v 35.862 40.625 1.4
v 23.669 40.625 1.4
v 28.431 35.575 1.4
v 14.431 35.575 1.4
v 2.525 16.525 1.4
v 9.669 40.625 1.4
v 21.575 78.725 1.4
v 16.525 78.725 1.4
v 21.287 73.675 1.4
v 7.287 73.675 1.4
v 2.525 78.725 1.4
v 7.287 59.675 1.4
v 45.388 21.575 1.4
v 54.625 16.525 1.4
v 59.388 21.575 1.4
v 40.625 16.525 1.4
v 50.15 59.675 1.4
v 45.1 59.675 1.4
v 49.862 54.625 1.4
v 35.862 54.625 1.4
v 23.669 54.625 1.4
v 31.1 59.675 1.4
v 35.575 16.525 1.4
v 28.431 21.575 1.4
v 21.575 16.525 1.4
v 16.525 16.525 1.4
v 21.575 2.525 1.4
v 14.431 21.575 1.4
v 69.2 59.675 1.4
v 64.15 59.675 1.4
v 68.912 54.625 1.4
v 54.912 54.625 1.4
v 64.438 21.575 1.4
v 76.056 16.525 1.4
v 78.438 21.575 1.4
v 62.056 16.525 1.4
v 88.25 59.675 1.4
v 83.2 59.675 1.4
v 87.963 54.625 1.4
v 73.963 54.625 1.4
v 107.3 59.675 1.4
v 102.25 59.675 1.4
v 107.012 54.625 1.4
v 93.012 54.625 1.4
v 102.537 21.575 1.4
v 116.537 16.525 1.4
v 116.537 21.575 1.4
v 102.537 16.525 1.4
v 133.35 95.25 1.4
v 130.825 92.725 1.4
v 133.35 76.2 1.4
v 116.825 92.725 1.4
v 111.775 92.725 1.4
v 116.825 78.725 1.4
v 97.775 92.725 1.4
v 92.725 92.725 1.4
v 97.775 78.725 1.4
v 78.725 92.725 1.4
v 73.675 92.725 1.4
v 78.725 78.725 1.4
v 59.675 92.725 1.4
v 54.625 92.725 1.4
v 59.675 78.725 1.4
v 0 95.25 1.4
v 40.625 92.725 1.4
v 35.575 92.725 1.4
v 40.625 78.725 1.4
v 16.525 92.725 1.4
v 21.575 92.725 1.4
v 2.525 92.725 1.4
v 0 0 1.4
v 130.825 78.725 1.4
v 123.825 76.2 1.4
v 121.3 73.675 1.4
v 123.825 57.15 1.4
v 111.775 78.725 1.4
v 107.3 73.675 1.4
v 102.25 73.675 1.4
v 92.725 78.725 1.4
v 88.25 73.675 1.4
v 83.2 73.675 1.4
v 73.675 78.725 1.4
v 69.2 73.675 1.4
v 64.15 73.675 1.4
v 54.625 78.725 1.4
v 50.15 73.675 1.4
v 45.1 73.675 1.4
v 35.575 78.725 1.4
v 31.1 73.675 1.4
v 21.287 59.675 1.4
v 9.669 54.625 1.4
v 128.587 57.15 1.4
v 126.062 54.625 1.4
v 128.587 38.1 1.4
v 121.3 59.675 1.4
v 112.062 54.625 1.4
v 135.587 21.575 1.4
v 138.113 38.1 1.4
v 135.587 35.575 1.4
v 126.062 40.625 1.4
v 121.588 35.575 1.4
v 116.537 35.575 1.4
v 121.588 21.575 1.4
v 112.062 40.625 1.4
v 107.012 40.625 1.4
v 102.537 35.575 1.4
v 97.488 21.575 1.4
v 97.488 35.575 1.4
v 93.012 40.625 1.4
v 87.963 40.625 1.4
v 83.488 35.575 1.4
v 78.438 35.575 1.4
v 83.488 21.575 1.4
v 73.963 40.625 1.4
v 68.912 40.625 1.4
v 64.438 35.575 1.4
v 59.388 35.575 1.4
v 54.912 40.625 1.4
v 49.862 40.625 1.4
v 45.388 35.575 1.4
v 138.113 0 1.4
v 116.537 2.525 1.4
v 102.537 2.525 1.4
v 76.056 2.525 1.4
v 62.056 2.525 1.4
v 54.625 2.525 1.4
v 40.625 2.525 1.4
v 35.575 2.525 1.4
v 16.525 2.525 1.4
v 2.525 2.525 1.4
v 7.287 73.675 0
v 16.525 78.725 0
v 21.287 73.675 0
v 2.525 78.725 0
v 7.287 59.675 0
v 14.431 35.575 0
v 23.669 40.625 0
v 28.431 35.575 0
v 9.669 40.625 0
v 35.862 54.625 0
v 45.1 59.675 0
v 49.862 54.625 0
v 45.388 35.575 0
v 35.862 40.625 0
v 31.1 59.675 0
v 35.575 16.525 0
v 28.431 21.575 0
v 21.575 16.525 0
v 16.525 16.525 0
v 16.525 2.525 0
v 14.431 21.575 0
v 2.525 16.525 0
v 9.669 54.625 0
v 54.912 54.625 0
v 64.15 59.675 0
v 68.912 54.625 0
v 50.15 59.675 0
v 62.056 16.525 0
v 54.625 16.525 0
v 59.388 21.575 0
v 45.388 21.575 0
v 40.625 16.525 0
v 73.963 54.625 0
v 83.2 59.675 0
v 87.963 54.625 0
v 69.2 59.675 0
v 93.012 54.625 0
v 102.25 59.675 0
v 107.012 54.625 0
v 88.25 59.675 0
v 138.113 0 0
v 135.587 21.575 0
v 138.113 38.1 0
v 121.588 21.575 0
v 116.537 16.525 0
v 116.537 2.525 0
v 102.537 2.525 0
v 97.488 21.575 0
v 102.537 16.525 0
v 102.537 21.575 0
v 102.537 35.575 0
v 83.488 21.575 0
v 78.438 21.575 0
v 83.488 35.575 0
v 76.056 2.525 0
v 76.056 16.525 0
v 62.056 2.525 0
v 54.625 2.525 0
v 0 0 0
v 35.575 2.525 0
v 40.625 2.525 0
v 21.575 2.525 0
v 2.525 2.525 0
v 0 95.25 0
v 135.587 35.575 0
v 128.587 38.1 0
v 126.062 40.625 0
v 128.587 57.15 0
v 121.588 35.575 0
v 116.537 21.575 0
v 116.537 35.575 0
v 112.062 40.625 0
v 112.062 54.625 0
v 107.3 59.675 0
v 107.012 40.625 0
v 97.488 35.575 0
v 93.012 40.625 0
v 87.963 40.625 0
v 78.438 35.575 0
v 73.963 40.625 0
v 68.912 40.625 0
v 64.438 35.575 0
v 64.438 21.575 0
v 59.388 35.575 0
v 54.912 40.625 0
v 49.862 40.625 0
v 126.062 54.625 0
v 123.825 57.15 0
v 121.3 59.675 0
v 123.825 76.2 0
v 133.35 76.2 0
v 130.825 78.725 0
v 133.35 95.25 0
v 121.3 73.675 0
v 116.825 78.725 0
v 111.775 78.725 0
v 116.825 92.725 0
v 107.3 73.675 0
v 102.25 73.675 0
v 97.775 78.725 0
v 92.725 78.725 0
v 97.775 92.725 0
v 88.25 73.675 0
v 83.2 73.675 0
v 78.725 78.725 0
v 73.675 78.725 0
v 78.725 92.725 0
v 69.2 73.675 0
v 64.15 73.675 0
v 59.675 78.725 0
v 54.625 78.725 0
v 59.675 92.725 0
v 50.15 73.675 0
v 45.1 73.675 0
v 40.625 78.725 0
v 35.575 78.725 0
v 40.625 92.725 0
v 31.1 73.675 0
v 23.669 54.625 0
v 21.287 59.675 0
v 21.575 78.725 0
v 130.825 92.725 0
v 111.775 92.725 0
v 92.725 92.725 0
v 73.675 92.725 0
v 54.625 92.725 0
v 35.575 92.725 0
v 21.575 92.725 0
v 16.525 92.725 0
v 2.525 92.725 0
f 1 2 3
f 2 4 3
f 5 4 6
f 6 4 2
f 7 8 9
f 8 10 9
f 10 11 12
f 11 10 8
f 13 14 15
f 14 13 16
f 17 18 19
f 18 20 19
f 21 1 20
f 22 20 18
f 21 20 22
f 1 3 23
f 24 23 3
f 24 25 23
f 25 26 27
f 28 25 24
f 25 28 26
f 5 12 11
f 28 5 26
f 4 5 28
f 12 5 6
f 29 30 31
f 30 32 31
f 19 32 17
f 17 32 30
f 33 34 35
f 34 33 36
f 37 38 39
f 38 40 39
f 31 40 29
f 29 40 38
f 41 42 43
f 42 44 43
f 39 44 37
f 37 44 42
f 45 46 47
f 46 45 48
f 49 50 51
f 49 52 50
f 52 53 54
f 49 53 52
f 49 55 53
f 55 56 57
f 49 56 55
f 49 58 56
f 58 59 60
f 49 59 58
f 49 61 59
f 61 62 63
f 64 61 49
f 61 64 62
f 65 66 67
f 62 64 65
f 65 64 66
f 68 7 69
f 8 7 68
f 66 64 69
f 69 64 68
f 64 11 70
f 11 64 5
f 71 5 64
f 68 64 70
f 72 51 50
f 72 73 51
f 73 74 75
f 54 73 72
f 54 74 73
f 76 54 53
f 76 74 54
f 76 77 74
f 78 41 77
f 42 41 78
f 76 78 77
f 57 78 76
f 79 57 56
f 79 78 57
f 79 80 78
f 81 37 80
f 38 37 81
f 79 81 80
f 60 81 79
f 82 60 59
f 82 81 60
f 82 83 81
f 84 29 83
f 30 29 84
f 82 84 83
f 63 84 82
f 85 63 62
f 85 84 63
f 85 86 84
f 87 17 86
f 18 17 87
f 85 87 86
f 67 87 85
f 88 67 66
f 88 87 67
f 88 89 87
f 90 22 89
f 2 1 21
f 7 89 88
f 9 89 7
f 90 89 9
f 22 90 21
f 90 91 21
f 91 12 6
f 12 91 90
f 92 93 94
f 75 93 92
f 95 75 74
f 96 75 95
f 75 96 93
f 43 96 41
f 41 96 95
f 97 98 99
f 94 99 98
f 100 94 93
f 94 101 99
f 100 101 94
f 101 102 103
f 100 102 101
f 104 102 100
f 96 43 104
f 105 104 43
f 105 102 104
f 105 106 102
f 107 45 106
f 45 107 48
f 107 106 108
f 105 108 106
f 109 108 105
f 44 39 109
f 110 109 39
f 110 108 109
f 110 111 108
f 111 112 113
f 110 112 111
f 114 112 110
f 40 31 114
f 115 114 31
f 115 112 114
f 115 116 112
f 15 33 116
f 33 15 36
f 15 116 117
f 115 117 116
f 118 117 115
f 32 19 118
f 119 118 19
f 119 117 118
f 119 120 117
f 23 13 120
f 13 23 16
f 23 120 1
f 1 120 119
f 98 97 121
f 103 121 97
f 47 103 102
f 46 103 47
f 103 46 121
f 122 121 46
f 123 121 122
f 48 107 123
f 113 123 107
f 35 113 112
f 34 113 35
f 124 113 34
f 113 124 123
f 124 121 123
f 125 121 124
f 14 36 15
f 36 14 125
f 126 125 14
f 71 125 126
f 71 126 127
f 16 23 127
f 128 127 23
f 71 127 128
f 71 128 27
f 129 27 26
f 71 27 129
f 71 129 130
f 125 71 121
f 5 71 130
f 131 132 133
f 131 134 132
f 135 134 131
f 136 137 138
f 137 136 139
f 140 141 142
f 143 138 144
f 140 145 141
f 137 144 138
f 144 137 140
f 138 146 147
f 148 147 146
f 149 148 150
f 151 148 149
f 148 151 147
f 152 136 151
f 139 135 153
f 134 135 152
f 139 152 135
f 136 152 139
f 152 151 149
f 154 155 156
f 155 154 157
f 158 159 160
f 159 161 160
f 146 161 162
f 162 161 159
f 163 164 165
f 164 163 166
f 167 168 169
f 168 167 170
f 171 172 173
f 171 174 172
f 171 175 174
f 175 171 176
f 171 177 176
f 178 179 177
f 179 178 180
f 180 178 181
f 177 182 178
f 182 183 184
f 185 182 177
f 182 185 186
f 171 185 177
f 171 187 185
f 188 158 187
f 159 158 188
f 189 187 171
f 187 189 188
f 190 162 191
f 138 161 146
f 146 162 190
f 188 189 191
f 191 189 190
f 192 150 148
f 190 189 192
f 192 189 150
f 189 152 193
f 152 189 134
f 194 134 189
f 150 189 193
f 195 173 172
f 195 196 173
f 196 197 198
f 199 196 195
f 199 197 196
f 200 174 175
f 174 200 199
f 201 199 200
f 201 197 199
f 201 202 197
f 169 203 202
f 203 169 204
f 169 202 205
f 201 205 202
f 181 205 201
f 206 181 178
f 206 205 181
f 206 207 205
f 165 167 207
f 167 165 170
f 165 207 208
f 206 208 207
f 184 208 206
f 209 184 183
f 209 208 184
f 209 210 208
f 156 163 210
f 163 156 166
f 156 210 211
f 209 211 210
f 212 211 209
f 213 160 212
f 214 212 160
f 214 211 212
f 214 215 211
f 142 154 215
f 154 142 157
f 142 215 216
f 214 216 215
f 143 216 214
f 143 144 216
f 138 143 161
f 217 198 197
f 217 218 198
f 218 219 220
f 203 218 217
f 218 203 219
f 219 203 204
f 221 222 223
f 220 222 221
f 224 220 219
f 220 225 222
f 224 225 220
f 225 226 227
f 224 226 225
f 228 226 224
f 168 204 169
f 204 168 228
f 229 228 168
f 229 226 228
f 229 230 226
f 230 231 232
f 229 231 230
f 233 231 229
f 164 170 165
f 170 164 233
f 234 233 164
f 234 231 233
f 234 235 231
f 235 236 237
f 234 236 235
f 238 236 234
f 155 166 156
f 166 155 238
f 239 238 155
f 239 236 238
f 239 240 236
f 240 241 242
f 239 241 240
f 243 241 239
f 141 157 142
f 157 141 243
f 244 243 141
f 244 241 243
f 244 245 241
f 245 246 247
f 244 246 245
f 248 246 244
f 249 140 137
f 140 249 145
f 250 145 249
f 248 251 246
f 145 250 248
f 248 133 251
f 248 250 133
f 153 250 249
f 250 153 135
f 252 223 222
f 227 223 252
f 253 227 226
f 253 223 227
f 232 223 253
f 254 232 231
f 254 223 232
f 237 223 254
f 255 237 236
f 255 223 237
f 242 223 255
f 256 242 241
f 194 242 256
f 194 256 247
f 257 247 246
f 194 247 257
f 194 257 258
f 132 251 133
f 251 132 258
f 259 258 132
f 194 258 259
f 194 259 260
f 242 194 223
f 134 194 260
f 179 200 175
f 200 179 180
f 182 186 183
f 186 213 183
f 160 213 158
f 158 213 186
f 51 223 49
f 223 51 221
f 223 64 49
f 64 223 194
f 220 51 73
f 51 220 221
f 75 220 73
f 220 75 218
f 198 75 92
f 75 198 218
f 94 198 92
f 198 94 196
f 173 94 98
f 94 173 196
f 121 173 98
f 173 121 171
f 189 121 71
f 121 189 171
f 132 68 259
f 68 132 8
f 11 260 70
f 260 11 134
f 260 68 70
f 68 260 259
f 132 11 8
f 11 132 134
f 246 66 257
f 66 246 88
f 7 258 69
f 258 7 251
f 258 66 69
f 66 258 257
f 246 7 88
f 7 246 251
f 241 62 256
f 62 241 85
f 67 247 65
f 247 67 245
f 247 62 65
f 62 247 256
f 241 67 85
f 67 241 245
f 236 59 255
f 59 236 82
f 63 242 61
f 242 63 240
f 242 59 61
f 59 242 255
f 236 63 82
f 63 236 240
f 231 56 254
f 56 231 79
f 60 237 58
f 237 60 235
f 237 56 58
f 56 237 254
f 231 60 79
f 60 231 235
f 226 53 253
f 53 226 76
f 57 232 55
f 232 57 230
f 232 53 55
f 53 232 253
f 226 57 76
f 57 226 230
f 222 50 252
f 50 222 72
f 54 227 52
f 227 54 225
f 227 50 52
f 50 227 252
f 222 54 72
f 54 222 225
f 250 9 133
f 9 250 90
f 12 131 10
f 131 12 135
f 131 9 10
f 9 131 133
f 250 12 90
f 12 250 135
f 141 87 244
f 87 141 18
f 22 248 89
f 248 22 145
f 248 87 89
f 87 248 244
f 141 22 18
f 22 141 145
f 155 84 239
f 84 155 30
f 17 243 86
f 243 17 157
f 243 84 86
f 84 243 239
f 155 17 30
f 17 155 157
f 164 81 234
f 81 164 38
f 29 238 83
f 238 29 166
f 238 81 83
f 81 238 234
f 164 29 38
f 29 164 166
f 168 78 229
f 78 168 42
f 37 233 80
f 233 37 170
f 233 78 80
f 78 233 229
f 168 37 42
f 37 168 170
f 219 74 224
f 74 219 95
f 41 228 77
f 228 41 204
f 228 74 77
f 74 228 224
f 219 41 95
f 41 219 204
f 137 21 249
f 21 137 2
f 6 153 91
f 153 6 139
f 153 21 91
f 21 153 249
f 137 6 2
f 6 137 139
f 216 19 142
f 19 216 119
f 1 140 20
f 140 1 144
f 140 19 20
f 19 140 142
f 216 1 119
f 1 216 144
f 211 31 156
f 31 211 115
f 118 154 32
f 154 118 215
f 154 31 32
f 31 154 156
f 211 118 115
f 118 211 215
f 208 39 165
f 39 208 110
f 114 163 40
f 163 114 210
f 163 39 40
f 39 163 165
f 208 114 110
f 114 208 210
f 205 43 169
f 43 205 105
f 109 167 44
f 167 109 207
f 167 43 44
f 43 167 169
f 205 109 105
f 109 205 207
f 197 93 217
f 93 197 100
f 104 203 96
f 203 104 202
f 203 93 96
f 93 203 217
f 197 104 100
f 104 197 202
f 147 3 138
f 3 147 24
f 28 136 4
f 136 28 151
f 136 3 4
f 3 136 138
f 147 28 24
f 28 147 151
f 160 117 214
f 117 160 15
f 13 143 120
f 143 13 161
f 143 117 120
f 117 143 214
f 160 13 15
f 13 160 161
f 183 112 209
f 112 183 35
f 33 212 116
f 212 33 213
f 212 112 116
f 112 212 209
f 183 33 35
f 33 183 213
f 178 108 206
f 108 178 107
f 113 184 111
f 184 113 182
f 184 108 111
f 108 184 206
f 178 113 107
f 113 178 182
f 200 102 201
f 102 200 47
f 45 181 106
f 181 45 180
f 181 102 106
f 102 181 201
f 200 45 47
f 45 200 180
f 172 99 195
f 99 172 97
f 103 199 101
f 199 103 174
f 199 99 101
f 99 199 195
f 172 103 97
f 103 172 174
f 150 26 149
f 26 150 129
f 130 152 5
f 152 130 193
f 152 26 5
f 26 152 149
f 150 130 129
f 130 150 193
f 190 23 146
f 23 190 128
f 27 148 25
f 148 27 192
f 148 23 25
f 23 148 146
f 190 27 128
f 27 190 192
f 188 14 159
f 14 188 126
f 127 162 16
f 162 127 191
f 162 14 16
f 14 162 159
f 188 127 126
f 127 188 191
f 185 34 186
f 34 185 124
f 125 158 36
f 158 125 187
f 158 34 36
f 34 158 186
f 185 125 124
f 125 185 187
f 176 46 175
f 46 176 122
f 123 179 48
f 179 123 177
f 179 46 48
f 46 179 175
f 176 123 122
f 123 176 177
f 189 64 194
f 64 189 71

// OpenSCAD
//Thickness of entire plate
plateThickness=1.4;
//Unit square length, from Cherry MX data sheet
lkey=19.05;
//Hole size, from Cherry MX data sheet
holesize=14;
//length, in units, of board
width=14.5;
//Height, in units, of board
height=5;
//Radius of mounting holes
mountingholeradius=1.5;
//height of switch clasp cutouts
cutoutheight = 3;
//width of switch clasp cutouts
cutoutwidth = 1;

// lower case generation
// cavity_height is the space in the lower case. Needs to be at last as tall
// as much as the key switches will extend below the plate or else they won't
// fit together.
cavity_height = 8; 

// case_floor_thickness: recommended to be at least 1.0mm. Also recommended to
// be an even multiple of your layer height. E.g., if layer height is 0.3mm,
// use 1.2 or 1.5. Don't use 1.0 because it can't be evenly divided by 0.3.
case_floor_thickness = 0.9;
// total case height: cavity_height + case_floor_thickness
case_height = cavity_height + case_floor_thickness;
// case_wall_thickness: For rigidity, recommend to be at least 3x your nozzle
// size. Also recommended to be an even multiple of your nozzle size.
case_wall_thickness = 1.2;
// inner and outer radius of mounting standoff on case
mount_receiver_outer_radius = mountingholeradius+0.5;
mount_receiver_inner_radius = mountingholeradius-0.5;


//calculated vars

holediff=lkey-holesize;
w=width*lkey;
h=height*lkey;

// [[column, row], offset (key width)]
//my custom keyboard layout layer
// http://www.keyboard-layout-editor.com/##@@=Esc&=!%0A1&=%2F@%0A2&=%23%0A3&=$%0A4&=%25%0A5&=%5E%0A6&=%2F&%0A7&=*%0A8&=(%0A9&=)%0A0&=%2F_%0A-&=+%0A%2F=&_w:1.5%3B&=Backspace%3B&@_w:1.5%3B&=Tab&=Q&=W&=E&=R&=T&=Y&=U&=I&=O&=P&=%7B%0A%5B&=%7D%0A%5D&=%7C%0A%5C%3B&@_w:1.75%3B&=Ctrl%0ACaps&=A&=S&=D&=F&=G&=H&=J&=K&=L&=%2F:%0A%2F%3B&=%22%0A'&_w:1.75%3B&=Enter%3B&@_w:2.25%3B&=Shift&=Z&=X&=C&=V&=B&=N&=M&=%3C%0A,&=%3E%0A.&_w:1.25%3B&=%3F%0A%2F%2F&=%E2%86%91&=Shift%0A%E7%84%A1%E5%A4%89%E6%8F%9B%3B&@=Fn&=~%0A%0A%0A%0A%0A%0A%60&=Alt&_w:1.25%3B&=Cmd%0A%E8%8B%B1%E6%95%B0&_w:3%3B&=&_w:3%3B&=&_w:1.25%3B&=Cmd%0A%E3%81%8B%E3%81%AA%0A%0A%0A%0A%0A%E3%82%AB%E3%83%8A&=%E2%86%90&=%E2%86%93&=%E2%86%92
myKeyboard = [
//start ROW 0
[[0,0],1], // esc
[[1,0],1], // 1
[[2,0],1], // 2
[[3,0],1], // 3
[[4,0],1], // 4
[[5,0],1], // 5
[[6,0],1], // 6
[[7,0],1], // 7
[[8,0],1], // 8
[[9,0],1], // 9
[[10,0],1], // 0
[[11,0],1], // -
[[12,0],1], // =
[[13,0],1.5], // bksp
//start ROW 1
[[  0,1],1.5], // tab
[[1.5,1],1], // q
[[2.5,1],1], // w
[[3.5,1],1], // e
[[4.5,1],1], // r
[[5.5,1],1], // t
[[6.5,1],1], // y
[[7.5,1],1], // u
[[8.5,1],1], // i
[[9.5,1],1], // o
[[10.5,1],1], // p
[[11.5,1],1], // [
[[12.5,1],1], // ]
[[13.5,1],1], // \
//start ROW 2
[[   0,2],1.75], // ctrl
[[1.75,2],1], // a
[[2.75,2],1], // s
[[3.75,2],1], // d
[[4.75,2],1], // f
[[5.75,2],1], // g
[[6.75,2],1], // h
[[7.75,2],1], // j
[[8.75,2],1], // k
[[9.75,2],1], // l
[[10.75,2],1], // ;
[[11.75,2],1], // '
[[12.75,2],1.75], // enter
//start ROW 3
[[   0,3],2.25], // lshift
[[2.25,3],1], // z
[[3.25,3],1], // x
[[4.25,3],1], // c
[[5.25,3],1], // v
[[6.25,3],1], // b
[[7.25,3],1], // n
[[8.25,3],1], // m
[[9.25,3],1], // ,
[[10.25,3],1], // .
[[11.25,3],1.25], // /
[[12.50,3],1], // up arrow
[[13.50,3],1], // rshift
//start ROW 4
[[0,4],1], // fn
[[1,4],1], // `
[[2,4],1], // alt
[[3,4],1.25], // lcmd
[[4.25,4],3], // space 1
[[7.25,4],3], // space 2
[[10.25,4],1.25], // rcmd
[[11.5,4],1], // left arrow
[[12.5 ,4],1], // down arrow
[[13.5,4],1], // right arrow
];

// [[column, row], offset (key width)]
myHalfKeyboardleft = [
//start ROW 0
[[0,0],1], // esc
[[1,0],1], // 1
[[2,0],1], // 2
[[3,0],1], // 3
[[4,0],1], // 4
[[5,0],1], // 5
[[6,0],1], // 6
// [[7,0],1], // 7
// [[8,0],1], // 8
// [[9,0],1], // 9
// [[10,0],1], // 0
// [[11,0],1], // -
// [[12,0],1], // =
// [[13,0],1.5], // bksp
//start ROW 1
[[  0,1],1.5], // tab
[[1.5,1],1], // q
[[2.5,1],1], // w
[[3.5,1],1], // e
[[4.5,1],1], // r
[[5.5,1],1], // t
// [[6.5,1],1], // y
// [[7.5,1],1], // u
// [[8.5,1],1], // i
// [[9.5,1],1], // o
// [[10.5,1],1], // p
// [[11.5,1],1], // [
// [[12.5,1],1], // ]
// [[13.5,1],1], // \
//start ROW 2
[[   0,2],1.75], // ctrl
[[1.75,2],1], // a
[[2.75,2],1], // s
[[3.75,2],1], // d
[[4.75,2],1], // f
[[5.75,2],1], // g
// [[6.75,2],1], // h
// [[7.75,2],1], // j
// [[8.75,2],1], // k
// [[9.75,2],1], // l
// [[10.75,2],1], // ;
// [[11.75,2],1], // '
// [[12.75,2],1.75], // enter
//start ROW 3
[[   0,3],2.25], // lshift
[[2.25,3],1], // z
[[3.25,3],1], // x
[[4.25,3],1], // c
[[5.25,3],1], // v
[[6.25,3],1], // b
// [[7.25,3],1], // n
// [[8.25,3],1], // m
// [[9.25,3],1], // ,
// [[10.25,3],1], // .
// [[11.25,3],1.25], // /
// [[12.50,3],1], // up arrow
// [[13.50,3],1], // rshift
//start ROW 4
[[0,4],1], // fn
[[1,4],1], // `
[[2,4],1], // alt
[[3,4],1.25], // lcmd
[[4.25,4],3], // space 1
// [[7.25,4],3], // space 2
// [[10.25,4],1.25], // rcmd
// [[11.5,4],1], // left arrow
// [[12.5 ,4],1], // down arrow
// [[13.5,4],1], // right arrow
];

// [[column, row], offset (key width)]
myHalfKeyboardright = [
//start ROW 0
// [[0,0],1], // esc
// [[1,0],1], // 1
// [[2,0],1], // 2
// [[3,0],1], // 3
// [[4,0],1], // 4
// [[5,0],1], // 5
// [[6,0],1], // 6
[[7,0],1], // 7
[[8,0],1], // 8
[[9,0],1], // 9
[[10,0],1], // 0
[[11,0],1], // -
[[12,0],1], // =
[[13,0],1.5], // bksp
//start ROW 1
// [[  0,1],1.5], // tab
// [[1.5,1],1], // q
// [[2.5,1],1], // w
// [[3.5,1],1], // e
// [[4.5,1],1], // r
// [[5.5,1],1], // t
[[6.5,1],1], // y
[[7.5,1],1], // u
[[8.5,1],1], // i
[[9.5,1],1], // o
[[10.5,1],1], // p
[[11.5,1],1], // [
[[12.5,1],1], // ]
[[13.5,1],1], // \
//start ROW 2
// [[   0,2],1.75], // ctrl
// [[1.75,2],1], // a
// [[2.75,2],1], // s
// [[3.75,2],1], // d
// [[4.75,2],1], // f
// [[5.75,2],1], // g
[[6.75,2],1], // h
[[7.75,2],1], // j
[[8.75,2],1], // k
[[9.75,2],1], // l
[[10.75,2],1], // ;
[[11.75,2],1], // '
[[12.75,2],1.75], // enter
//start ROW 3
// [[   0,3],2.25], // lshift
// [[2.25,3],1], // z
// [[3.25,3],1], // x
// [[4.25,3],1], // c
// [[5.25,3],1], // v
// [[6.25,3],1], // b
[[7.25,3],1], // n
[[8.25,3],1], // m
[[9.25,3],1], // ,
[[10.25,3],1], // .
[[11.25,3],1.25], // /
[[12.50,3],1], // up arrow
[[13.50,3],1], // rshift
//start ROW 4
// [[0,4],1], // fn
// [[1,4],1], // `
// [[2,4],1], // alt
// [[3,4],1.25], // lcmd
// [[4.25,4],3], // space 1
[[7.25,4],3], // space 2
[[10.25,4],1.25], // rcmd
[[11.5,4],1], // left arrow
[[12.5 ,4],1], // down arrow
[[13.5,4],1], // right arrow
];

//poker keyboard layout layer
pokerkeyboard = [
//start ROW 0
[[0,0],1],
[[1,0],1],
[[2,0],1],
[[3,0],1],
[[4,0],1],
[[5,0],1],
[[6,0],1],
[[7,0],1],
[[8,0],1],
[[9,0],1],
[[10,0],1],
[[11,0],1],
[[12,0],1],
[[13,0],2],
//start ROW 1
[[  0,1],1.5],
[[1.5,1],1],
[[2.5,1],1],
[[3.5,1],1],
[[4.5,1],1],
[[5.5,1],1],
[[6.5,1],1],
[[7.5,1],1],
[[8.5,1],1],
[[9.5,1],1],
[[10.5,1],1],
[[11.5,1],1],
[[12.5,1],1],
[[13.5,1],1.5],
//start ROW 2
[[   0,2],1.75],
[[1.75,2],1],
[[2.75,2],1],
[[3.75,2],1],
[[4.75,2],1],
[[5.75,2],1],
[[6.75,2],1],
[[7.75,2],1],
[[8.75,2],1],
[[9.75,2],1],
[[10.75,2],1],
[[11.75,2],1],
[[12.75,2],2.25],
//start ROW 3
[[   0,3],2.25],
[[2.25,3],1],
[[3.25,3],1],
[[4.25,3],1],
[[5.25,3],1],
[[6.25,3],1],
[[7.25,3],1],
[[8.25,3],1],
[[9.25,3],1],
[[10.25,3],1],
[[11.25,3],1],
[[12.25,3],2.75],
//start ROW 4
[[   0,4],1.25],
[[1.25,4],1.25],
[[2.5 ,4],1.25],
[[3.75,4],6.25],
[[10  ,4],1.25],
[[11.25,4],1.25],
[[12.5 ,4],1.25],
[[13.75,4],1.25],
];

// small keyboard to test fitting
testKeyboard = [
//start ROW 0
[[0,0.5],1], // key
[[1,0],1], // key
[[2,0],1], // key
[[3,0],1], // key
[[4,0.25],1], // key
//start ROW 1
[[0,1.5],1], // key
[[1,1],1], // key
[[2,1],1], // key
[[3,1],1], // key
[[4,1.25],1], // key
//start ROW 2
[[0,2.5],1], // key
[[1,2],1], // key
[[2,2],1], // key
[[3,2],1], // key
[[4,2.25],1], // key
];

module plate(w,h){
	cube([w,h,plateThickness]);
}

module switchhole(){
	union(){
		cube([holesize,holesize,plateThickness]);

    // Top clip cutout
		// translate([-cutoutwidth,1,0])
		// cube([holesize+2*cutoutwidth,cutoutheight,plateThickness]);

    // Bottom clip cutout
		// translate([-cutoutwidth,holesize-cutoutwidth-cutoutheight,0])
		// cube([holesize+2*cutoutwidth,cutoutheight,plateThickness]);
	}
}

row_maximums = [];

module holematrix(holes,startx,starty){
	for (key = holes){
		translate([startx+lkey*key[0][0], starty-lkey*key[0][1], 0])
		translate([(lkey*key[1]-holesize)/2,(lkey - holesize)/2, 0])
		switchhole();
	}
}

module mountingholes(){
	translate([(1+1/3)*lkey,3.5*lkey,0]) mounting_hole();

	translate([(13+2/3)*lkey,3.5*lkey,0]) mounting_hole();

	translate([(6.75)*lkey,2.5*lkey,0]) mounting_hole();

	translate([(6.75)*lkey,2.5*lkey,0]) mounting_hole();

	translate([(14.8)*lkey,2*lkey,0]) mounting_hole();

	translate([(.2)*lkey,2*lkey,0]) mounting_hole();

	translate([(10)*lkey,.5*lkey,0]) mounting_hole();
}

module mounting_hole(){
  cylinder(h=plateThickness,r=mountingholeradius, $fn=16);
}

module mounting_standoff(){
  difference() {
    // bottom of standoff is flared for stability
    cylinder(h=case_height,r1=mount_receiver_outer_radius+1.3, r2=mount_receiver_outer_radius, $fn=16);
    cylinder(h=case_height,r=mount_receiver_inner_radius, $fn=16);
  }
}

module myplate(){
	difference(){
		plate(w,h);
		holematrix(myKeyboard,0,h-lkey);
		// mountingholes();
		//translate([152.5,0,0]) cube([.001,150,150]);
	}
}

module myhalfplate(){
  difference(){
    plate(w,h);

    truncations = [
      [[7,0],1],
      [[6.5,1],1],
      [[6.75,2],1],
      [[7.25,3],1],
      [[7.25,4],3]
    ];
    truncateplateright(0,h-lkey,plateThickness,truncations);

    // truncations = [
    //   [[6,0],1], // 6
    //   [[5.5,1],1], // t
    //   [[5.75,2],1], // g
    //   [[6.25,3],1], // b
    //   [[4.25,4],3], // space 1
    // ];
    // truncateplateleft(0,h-lkey,plateThickness,truncations);

    holematrix(myHalfKeyboardleft,0,h-lkey);
    // holematrix(myHalfKeyboardright,0,h-lkey);
    // mountingholes();
    //translate([152.5,0,0]) cube([.001,150,150]);
  }
}

module myhalfcase(){
  // difference() {
  //   cube([w,h,case_height]);
  //   translate([case_wall_thickness,case_wall_thickness,case_floor_thickness])
  //     cube([w-(case_wall_thickness*2),h-(case_wall_thickness*2),case_height]);
  // }
  truncations = [
    [[6,0],1], // 6
    [[5.5,1],1], // t
    [[5.75,2],1], // g
    [[6.25,3],1], // b
    [[4.25,4],3], // space 1
  ];
  difference() {
    // scale([case_wall_thickness,case_wall_thickness,case_floor_thickness])
    truncateplateleft(0,h-lkey,case_height,truncations);
    scale([0.9,0.95,1.0])
      translate([case_wall_thickness,case_wall_thickness,case_floor_thickness])
        truncateplateleft(0,h-lkey,case_height,truncations);
    
  }
}

module truncateplateright(startx, starty, thickness, truncations) {
  // startx = 0;
  // starty = h-lkey;
  for (truncation = truncations){
    toffset = truncation[0][0];
    trow = truncation[0][1];
    twidth = truncation[1];
    echo(toffset=toffset, trow=trow, twidth=twidth);
    translate([startx+lkey*toffset, starty-lkey*trow, 0]) {
      // translate([(lkey*twidth-holesize)/2,(lkey - holesize)/2, 0]) {
        cube([w,lkey,thickness]);
      // }
    }
  }
}

module truncateplateleft(startx, starty, thickness, truncations) {
  // startx = 0;
  // starty = h-lkey;
  for (truncation = truncations){
    toffset = truncation[0][0];
    trow = truncation[0][1];
    twidth = truncation[1];
    echo(toffset=toffset, trow=trow, twidth=twidth);
    translate([0, starty-lkey*trow, 0]) {
      // translate([(lkey*twidth-holesize)/2,(lkey - holesize)/2, 0]) {
        cube([(startx+lkey*toffset)+(twidth*lkey),lkey,thickness]);
      // }
    } 
  }
}

module pokerplate(){
	difference(){
		plate(w,h);
		holematrix(pokerkeyboard,0,h-lkey);
		mountingholes();
	}
}

module testplate(){
  difference(){
    plate(w,h);
    holematrix(testKeyboard,0,h-lkey);
    // mounting holes
    translate([lkey/5,(height*lkey)-(lkey/5),0]) mounting_hole();
    translate([(width*lkey)-(lkey/5),(height*lkey)-(lkey/5),0]) mounting_hole();

    translate([lkey/5,lkey/5,0]) mounting_hole();
    translate([(width*lkey)-(lkey/5),lkey/5,0]) mounting_hole();

    translate([((width/2)*lkey),lkey/5,0]) mounting_hole();

    translate([(lkey*1),lkey*0.75,0]) mounting_hole();
    translate([(lkey*1),lkey*1.75,0]) mounting_hole();
    translate([(lkey*1),lkey*2.75,0]) mounting_hole();

    translate([(lkey*2),lkey*0.75,0]) mounting_hole();
    translate([(lkey*2),lkey*1.75,0]) mounting_hole();
    translate([(lkey*2),lkey*2.75,0]) mounting_hole();

    translate([(lkey*3),lkey*0.75,0]) mounting_hole();
    translate([(lkey*3),lkey*1.75,0]) mounting_hole();
    translate([(lkey*3),lkey*2.75,0]) mounting_hole();

    translate([(lkey*4),lkey*0.75,0]) mounting_hole();
    translate([(lkey*4),lkey*1.75,0]) mounting_hole();
    translate([(lkey*4),lkey*2.75,0]) mounting_hole();
    
    // translate([(lkey*3)+(lkey/2),lkey/3,0])
    // cylinder(h=plateThickness,r=mountingholeradius, $fn=16);
    // translate([(lkey*4)+(lkey/1.5),lkey/5,0])
    // cylinder(h=plateThickness,r=mountingholeradius, $fn=16);
  }
}

module testcase(){
  difference() {
    cube([w,h,case_height]);
    translate([case_wall_thickness,case_wall_thickness,case_floor_thickness])
      cube([w-(case_wall_thickness*2),h-(case_wall_thickness*2),case_height]);
  }

  // mounting hole standoffs
  translate([lkey/5,(height*lkey)-(lkey/5),0]) mounting_standoff();
  translate([(width*lkey)-(lkey/5),(height*lkey)-(lkey/5),0]) mounting_standoff();

  translate([lkey/5,lkey/5,0]) mounting_standoff();
  translate([(width*lkey)-(lkey/5),lkey/5,0]) mounting_standoff();

  translate([((width/2)*lkey),lkey/5,0]) mounting_standoff();

  translate([(lkey*1),lkey*0.75,0]) mounting_standoff();
  translate([(lkey*1),lkey*1.75,0]) mounting_standoff();
  translate([(lkey*1),lkey*2.75,0]) mounting_standoff();

  translate([(lkey*2),lkey*0.75,0]) mounting_standoff();
  translate([(lkey*2),lkey*1.75,0]) mounting_standoff();
  translate([(lkey*2),lkey*2.75,0]) mounting_standoff();

  translate([(lkey*3),lkey*0.75,0]) mounting_standoff();
  translate([(lkey*3),lkey*1.75,0]) mounting_standoff();
  translate([(lkey*3),lkey*2.75,0]) mounting_standoff();

  translate([(lkey*4),lkey*0.75,0]) mounting_standoff();
  translate([(lkey*4),lkey*1.75,0]) mounting_standoff();
  translate([(lkey*4),lkey*2.75,0]) mounting_standoff();
}

// pokerplate();
// myplate();

myhalfplate();
// myhalfcase();

// test plate setting here
//length, in units, of board
// width=5;
//Height, in units, of board
// height=3.75;
// testplate();
// testcase();
